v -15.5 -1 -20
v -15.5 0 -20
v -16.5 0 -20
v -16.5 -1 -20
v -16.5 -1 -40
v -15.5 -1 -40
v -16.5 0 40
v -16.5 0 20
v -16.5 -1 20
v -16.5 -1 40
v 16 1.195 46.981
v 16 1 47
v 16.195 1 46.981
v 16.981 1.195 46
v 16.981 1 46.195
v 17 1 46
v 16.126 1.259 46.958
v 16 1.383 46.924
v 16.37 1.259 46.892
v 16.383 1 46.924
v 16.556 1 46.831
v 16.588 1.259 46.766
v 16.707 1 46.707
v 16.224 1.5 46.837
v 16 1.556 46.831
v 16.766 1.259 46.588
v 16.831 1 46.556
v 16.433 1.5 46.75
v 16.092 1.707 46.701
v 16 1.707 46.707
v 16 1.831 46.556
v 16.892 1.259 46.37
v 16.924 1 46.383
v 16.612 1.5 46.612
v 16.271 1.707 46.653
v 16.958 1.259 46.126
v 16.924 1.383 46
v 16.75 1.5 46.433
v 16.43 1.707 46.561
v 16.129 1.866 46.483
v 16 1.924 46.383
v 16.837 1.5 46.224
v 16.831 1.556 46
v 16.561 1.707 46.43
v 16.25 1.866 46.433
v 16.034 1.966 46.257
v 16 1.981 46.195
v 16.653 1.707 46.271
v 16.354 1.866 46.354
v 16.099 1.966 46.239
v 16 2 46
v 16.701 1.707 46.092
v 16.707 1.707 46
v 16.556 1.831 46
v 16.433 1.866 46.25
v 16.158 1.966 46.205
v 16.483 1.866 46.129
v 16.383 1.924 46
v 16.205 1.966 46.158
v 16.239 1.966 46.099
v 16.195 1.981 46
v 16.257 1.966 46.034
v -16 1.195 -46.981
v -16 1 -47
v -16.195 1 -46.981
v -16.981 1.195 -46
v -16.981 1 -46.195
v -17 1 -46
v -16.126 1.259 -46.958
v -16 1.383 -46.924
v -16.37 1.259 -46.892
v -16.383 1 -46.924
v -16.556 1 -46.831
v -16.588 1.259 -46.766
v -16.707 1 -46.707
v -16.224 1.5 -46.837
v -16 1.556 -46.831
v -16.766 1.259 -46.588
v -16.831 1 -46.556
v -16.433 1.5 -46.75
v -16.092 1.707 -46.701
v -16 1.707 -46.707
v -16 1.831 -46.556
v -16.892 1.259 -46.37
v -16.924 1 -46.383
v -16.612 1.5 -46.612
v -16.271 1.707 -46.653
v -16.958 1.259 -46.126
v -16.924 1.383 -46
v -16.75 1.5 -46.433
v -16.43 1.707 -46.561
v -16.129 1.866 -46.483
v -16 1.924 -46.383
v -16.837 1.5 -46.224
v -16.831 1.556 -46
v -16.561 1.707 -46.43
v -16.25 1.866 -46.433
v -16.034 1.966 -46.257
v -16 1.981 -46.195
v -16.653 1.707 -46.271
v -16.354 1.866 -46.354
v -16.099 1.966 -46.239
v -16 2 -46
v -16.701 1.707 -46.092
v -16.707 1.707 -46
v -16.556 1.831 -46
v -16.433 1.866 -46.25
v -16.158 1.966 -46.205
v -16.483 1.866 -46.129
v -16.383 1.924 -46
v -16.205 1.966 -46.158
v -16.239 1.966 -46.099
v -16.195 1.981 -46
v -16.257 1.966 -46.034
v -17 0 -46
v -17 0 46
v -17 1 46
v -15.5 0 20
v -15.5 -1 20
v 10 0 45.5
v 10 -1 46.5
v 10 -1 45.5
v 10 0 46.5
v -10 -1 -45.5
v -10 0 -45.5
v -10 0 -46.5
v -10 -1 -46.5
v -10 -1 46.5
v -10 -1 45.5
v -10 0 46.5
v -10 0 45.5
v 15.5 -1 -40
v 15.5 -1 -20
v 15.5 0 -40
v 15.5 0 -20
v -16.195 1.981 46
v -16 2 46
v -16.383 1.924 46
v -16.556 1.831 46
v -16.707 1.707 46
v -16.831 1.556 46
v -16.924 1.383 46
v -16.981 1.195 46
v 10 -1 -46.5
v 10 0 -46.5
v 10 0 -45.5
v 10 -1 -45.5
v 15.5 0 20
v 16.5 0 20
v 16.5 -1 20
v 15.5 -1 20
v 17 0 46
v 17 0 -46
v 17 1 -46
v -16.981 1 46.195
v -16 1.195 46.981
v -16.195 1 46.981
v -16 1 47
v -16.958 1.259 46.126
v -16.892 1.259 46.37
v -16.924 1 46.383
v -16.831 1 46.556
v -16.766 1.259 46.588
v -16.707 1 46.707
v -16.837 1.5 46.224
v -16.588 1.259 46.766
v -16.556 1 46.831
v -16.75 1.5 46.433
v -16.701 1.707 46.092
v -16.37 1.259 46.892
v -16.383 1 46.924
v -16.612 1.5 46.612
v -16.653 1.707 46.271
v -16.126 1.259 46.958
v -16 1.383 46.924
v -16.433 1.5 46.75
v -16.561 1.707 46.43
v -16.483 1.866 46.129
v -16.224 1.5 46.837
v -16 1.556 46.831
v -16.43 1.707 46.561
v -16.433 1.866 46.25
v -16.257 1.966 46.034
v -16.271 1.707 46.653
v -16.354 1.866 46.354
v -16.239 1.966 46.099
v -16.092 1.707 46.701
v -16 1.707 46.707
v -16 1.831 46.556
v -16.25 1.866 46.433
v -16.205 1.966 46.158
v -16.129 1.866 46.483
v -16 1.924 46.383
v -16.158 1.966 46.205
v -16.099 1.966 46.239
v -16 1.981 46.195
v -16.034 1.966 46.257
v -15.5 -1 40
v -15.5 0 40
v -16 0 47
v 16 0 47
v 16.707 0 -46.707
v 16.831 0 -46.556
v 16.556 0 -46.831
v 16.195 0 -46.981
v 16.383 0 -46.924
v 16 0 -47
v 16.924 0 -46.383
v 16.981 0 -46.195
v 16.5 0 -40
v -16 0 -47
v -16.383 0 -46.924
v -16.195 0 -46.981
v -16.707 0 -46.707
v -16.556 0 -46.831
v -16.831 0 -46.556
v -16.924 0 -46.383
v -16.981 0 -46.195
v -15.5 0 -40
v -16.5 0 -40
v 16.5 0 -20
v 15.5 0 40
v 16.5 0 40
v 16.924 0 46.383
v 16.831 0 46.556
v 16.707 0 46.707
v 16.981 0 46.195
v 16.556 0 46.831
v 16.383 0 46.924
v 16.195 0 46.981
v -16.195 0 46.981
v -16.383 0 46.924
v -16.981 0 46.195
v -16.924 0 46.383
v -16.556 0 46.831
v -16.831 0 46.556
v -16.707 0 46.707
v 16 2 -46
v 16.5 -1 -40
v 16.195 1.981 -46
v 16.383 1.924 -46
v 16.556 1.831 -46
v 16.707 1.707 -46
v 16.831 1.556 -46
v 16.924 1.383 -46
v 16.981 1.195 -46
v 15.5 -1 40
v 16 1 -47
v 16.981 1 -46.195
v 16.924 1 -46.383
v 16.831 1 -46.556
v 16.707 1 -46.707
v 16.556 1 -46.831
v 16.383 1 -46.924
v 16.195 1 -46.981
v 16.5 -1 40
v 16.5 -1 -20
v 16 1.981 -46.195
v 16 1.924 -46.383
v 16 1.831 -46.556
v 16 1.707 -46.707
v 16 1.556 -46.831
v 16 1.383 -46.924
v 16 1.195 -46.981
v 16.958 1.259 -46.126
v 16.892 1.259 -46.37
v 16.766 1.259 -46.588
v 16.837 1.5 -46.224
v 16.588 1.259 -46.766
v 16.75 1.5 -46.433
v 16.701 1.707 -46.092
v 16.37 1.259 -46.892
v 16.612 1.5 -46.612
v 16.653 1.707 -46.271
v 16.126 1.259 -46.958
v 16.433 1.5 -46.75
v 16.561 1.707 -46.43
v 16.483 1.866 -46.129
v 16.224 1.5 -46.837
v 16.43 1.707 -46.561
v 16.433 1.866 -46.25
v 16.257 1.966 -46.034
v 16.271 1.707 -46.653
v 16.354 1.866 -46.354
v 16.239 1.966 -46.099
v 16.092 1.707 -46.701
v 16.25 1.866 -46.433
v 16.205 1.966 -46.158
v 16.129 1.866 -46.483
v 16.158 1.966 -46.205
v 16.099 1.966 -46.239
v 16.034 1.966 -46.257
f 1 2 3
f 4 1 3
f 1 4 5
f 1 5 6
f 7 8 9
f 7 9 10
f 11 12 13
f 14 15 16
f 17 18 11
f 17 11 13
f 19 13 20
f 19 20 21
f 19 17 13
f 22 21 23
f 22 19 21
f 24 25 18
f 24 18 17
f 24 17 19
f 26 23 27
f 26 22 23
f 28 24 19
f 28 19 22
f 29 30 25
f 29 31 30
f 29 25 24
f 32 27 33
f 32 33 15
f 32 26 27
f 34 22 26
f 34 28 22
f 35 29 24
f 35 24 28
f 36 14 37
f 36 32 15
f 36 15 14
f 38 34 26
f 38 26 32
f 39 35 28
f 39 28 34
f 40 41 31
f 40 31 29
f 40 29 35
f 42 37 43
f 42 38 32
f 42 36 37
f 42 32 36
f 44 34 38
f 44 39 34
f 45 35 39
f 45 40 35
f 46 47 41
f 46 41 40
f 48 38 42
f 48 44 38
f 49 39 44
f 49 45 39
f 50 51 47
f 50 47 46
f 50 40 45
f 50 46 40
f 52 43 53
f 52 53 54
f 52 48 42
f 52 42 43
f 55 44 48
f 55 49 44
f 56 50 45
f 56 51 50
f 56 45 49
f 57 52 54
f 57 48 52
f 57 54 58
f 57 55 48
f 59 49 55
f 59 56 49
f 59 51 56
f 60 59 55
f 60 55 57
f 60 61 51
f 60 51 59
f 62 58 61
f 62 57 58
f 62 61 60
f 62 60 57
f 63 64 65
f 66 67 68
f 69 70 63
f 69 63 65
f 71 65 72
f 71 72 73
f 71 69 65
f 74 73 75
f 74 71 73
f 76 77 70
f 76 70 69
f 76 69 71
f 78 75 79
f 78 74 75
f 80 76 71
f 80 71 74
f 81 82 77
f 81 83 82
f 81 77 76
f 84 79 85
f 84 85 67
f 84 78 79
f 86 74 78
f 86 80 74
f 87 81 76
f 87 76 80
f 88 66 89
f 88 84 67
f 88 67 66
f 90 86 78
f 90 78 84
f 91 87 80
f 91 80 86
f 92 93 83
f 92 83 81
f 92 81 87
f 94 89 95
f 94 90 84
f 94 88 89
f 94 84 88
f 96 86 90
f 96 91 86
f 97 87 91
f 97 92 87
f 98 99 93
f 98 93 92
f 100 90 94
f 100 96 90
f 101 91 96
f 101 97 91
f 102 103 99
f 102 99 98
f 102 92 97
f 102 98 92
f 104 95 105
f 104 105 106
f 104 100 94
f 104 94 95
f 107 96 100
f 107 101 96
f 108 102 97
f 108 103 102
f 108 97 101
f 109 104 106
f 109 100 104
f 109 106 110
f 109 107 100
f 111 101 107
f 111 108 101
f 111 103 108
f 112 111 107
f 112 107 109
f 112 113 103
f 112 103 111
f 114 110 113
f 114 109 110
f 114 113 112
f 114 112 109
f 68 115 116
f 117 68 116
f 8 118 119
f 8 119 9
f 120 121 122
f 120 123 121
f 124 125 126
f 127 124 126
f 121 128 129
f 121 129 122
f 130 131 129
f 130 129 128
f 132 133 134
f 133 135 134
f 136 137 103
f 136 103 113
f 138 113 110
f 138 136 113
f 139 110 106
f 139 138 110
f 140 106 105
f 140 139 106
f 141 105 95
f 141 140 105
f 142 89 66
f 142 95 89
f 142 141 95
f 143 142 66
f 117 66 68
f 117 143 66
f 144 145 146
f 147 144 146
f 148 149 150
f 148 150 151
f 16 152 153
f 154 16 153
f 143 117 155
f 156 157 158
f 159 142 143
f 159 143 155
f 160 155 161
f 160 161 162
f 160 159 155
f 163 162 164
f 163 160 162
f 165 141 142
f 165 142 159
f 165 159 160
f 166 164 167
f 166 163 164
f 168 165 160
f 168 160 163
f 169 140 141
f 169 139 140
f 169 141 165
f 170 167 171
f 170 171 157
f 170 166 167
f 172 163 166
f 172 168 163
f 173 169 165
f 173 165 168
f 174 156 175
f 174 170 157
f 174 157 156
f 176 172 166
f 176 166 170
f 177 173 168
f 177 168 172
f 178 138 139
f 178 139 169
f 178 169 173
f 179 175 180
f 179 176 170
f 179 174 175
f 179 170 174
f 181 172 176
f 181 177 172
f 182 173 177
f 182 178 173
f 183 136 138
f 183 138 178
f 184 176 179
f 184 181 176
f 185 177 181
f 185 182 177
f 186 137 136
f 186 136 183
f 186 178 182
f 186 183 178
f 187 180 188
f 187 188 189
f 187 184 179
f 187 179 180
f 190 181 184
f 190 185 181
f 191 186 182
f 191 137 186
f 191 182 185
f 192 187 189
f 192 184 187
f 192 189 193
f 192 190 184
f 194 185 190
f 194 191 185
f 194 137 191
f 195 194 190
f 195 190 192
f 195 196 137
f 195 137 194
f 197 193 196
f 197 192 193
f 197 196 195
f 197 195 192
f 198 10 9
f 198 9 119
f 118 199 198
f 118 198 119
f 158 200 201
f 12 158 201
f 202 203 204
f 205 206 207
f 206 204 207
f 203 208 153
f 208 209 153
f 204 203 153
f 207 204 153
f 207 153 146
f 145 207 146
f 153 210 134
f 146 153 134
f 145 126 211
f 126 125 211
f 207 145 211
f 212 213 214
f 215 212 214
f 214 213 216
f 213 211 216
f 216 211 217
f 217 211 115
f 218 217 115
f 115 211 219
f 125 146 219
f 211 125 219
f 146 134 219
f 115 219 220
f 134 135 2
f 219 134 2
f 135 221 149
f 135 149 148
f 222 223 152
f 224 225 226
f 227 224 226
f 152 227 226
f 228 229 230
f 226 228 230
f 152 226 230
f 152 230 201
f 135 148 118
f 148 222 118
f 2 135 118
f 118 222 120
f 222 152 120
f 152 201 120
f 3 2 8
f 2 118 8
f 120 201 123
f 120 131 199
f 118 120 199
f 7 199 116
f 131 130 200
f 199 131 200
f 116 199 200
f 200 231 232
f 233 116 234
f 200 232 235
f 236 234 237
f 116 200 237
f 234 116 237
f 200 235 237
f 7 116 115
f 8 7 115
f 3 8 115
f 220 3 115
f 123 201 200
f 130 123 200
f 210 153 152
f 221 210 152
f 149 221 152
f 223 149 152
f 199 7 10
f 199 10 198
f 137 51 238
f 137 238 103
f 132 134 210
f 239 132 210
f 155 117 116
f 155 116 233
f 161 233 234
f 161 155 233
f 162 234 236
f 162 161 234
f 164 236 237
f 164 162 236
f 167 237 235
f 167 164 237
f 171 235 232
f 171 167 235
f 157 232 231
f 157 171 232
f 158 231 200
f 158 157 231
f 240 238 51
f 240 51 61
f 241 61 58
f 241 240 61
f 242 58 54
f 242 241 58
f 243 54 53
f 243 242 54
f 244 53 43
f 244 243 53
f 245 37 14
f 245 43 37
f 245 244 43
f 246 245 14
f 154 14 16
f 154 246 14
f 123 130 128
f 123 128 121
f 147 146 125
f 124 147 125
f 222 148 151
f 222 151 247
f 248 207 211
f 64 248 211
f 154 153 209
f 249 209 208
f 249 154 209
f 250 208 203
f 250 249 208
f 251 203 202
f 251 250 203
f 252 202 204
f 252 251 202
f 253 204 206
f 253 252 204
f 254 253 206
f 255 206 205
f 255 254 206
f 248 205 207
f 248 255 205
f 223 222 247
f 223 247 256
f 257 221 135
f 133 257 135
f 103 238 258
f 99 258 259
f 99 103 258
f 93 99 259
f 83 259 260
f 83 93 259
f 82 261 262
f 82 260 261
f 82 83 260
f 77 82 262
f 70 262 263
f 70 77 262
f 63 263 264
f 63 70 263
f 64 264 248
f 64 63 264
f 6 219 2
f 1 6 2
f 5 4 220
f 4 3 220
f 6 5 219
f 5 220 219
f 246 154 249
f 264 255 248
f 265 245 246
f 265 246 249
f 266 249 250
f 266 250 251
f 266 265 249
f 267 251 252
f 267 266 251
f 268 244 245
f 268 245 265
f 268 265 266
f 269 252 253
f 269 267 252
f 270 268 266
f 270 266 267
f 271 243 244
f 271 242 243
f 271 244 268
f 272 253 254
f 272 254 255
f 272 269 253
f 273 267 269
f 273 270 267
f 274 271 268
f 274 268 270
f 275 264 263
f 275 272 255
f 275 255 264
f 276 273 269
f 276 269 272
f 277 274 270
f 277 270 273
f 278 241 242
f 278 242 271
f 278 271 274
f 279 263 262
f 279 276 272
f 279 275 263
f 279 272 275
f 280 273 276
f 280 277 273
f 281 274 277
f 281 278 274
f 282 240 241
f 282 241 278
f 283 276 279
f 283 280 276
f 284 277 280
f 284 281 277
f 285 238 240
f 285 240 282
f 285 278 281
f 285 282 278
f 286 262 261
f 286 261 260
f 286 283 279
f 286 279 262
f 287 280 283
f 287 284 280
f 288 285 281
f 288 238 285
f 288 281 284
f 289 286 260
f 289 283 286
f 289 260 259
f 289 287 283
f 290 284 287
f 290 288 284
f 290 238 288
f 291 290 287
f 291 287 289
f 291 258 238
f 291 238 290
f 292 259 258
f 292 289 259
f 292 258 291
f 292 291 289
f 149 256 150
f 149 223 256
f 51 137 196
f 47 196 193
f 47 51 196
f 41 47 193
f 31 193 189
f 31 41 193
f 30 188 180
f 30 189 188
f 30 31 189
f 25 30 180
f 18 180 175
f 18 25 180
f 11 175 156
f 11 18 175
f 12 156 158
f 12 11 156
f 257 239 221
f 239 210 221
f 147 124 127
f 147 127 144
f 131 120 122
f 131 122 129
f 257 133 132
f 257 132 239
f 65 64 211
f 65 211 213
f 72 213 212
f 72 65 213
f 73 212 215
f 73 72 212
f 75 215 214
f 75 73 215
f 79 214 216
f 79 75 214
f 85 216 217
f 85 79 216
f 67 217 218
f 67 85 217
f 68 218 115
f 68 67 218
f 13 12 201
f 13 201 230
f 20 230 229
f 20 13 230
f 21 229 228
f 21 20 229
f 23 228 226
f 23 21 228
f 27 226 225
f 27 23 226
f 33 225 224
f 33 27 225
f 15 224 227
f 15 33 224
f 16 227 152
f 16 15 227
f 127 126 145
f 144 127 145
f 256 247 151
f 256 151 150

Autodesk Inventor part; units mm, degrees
ref_plane "YZ Plane" through (0, 0, 0) normal (1, 0, 0) x (0, 1, 0)
ref_plane "XZ Plane" through (0, 0, 0) normal (0, 1, 0) x (-1, 0, 0)
ref_plane "XY Plane" through (0, 0, 0) normal (0, 0, 1) x (1, 0, 0)
sketch "Sketch4" plane through (0, 0, 0) normal (0, 1, 0) x (-1, 0, 0)
  line L0 (17, 47) -> (-17, 47)
  line L1 (-17, 47) -> (-17, -47)
  line L2 (-17, -47) -> (17, -47)
  line L3 (17, -47) -> (17, 47)
  line L4 (17, 47) -> (-17, -47) construction
  line L5 (-17, 47) -> (17, -47) construction
  point P0 (0, 0)
  dimension "d52" = 34
  dimension "d53" = 94
extrude "Extrusion5" add sketch "Sketch4" along normal blind 2
sketch "Sketch6" plane through (0, 0, 0) normal (0, -1, 0) x (1, 0, 0)
  line L0 (-16.5, -40) -> (-15.5, -40)
  line L1 (-15.5, -40) -> (-15.5, -20)
  line L2 (-15.5, -20) -> (-16.5, -20)
  line L3 (-16.5, -20) -> (-16.5, -40)
  line L4 (-15.5, 20) -> (-16.5, 20)
  line L5 (-16.5, 20) -> (-16.5, 40)
  line L6 (-16.5, 40) -> (-15.5, 40)
  line L7 (-15.5, 40) -> (-15.5, 20)
  line L8 (-10, 46.5) -> (10, 46.5)
  line L9 (10, 46.5) -> (10, 45.5)
  line L10 (10, 45.5) -> (-10, 45.5)
  line L11 (-10, 45.5) -> (-10, 46.5)
  line L12 (10, 46.5) -> (-10, 46.5)
  line L13 (-10, 46.5) -> (-10, 45.5)
  line L14 (-10, 45.5) -> (10, 45.5)
  line L15 (10, 45.5) -> (10, 46.5)
  line L16 (15.5, 40) -> (16.5, 40)
  line L17 (16.5, 40) -> (16.5, 20)
  line L18 (16.5, 20) -> (15.5, 20)
  line L19 (15.5, 20) -> (15.5, 40)
  line L20 (15.5, -40) -> (16.5, -40)
  line L21 (16.5, -40) -> (16.5, -20)
  line L22 (16.5, -20) -> (15.5, -20)
  line L23 (15.5, -20) -> (15.5, -40)
  line L24 (10, -45.5) -> (-10, -45.5)
  line L25 (-10, -45.5) -> (-10, -46.5)
  line L26 (-10, -46.5) -> (10, -46.5)
  line L27 (10, -46.5) -> (10, -45.5)
  line L28 (-10, -45.5) -> (10, -45.5)
  line L29 (10, -45.5) -> (10, -46.5)
  line L30 (10, -46.5) -> (-10, -46.5)
  line L31 (-10, -46.5) -> (-10, -45.5)
  line L32 (-17, 47) -> (-17, -47)
  line L33 (17, 47) -> (-17, 47)
  line L34 (17, -47) -> (17, 47)
  line L35 (-17, -47) -> (17, -47)
  line L36 (17, 47) -> (17, -47) projected
  line L37 (-17, -47) -> (-17, 47) projected
  line L38 (-17, 47) -> (17, 47) projected
  line L39 (17, -47) -> (-17, -47) projected
  point P0 (0, 0)
  point P1 (-16, 40)
  point P2 (-16, 20)
  point P3 (16, 40)
  point P4 (16, -40)
  point P5 (-10, -46)
  point P6 (-16, -40)
  dimension "d123" = 1
  dimension "d124" = 20
  dimension "d119" = 1
  dimension "d118" = 20
  dimension "d116" = 20
  dimension "d117" = 1
  dimension "d112" = 20
  dimension "d113" = 1
  dimension "d108" = 1
  dimension "d109" = 20
  dimension "d104" = 1
  dimension "d105" = 20
  dimension "d101" = 20
  dimension "d102" = 1
  dimension "d97" = 20
  dimension "d98" = 1
  dimension "d114" = 7
  dimension "d115" = 0.5
  dimension "d111" = 0.5
  dimension "d110" = 7
  dimension "d107" = 7
  dimension "d106" = 0.5
  dimension "d103" = 0.5
  dimension "d95" = 7
  dimension "d99" = 7
  dimension "d100" = 0.5
  dimension "d96" = 0.5
  dimension "d94" = 7
  dimension "d93" = 7
  dimension "d122" = 0.5
  dimension "d120" = 7
  dimension "d121" = 0.5
  dimension "d133" = 0
  dimension "d134" = 0
  dimension "d135" = 0
  dimension "d136" = 0
extrude "Extrusion7" add sketch "Sketch6" along normal blind 1 contours L3 L2 L1 L0 | L4 L5 L6 L7 | L8 L9 L10 L11 | L16 L17 L18 L19 | L23 L22 L21 L20 | L27 L26 L25 L24
fillet "Fillet9" radius 1 1 edges at (17, 1, -47)
fillet "Fillet10" radius 1 1 edges at (-17, 1, -47)
fillet "Fillet11" radius 1 1 edges at (-17, 1, 47)
fillet "Fillet12" radius 1 1 edges at (17, 1, 47)
fillet "Fillet13" radius 1 8 edges at (-16.7071, 2, -46.7071) (-17, 2, 0) (-16.7071, 2, 46.7071) (0, 2, 47) (16.7071, 2, 46.7071) (17, 2, 0) (16.7071, 2, -46.7071) (0, 2, -47)
properties part number "block_main" material "PC/ABS Plastic"
